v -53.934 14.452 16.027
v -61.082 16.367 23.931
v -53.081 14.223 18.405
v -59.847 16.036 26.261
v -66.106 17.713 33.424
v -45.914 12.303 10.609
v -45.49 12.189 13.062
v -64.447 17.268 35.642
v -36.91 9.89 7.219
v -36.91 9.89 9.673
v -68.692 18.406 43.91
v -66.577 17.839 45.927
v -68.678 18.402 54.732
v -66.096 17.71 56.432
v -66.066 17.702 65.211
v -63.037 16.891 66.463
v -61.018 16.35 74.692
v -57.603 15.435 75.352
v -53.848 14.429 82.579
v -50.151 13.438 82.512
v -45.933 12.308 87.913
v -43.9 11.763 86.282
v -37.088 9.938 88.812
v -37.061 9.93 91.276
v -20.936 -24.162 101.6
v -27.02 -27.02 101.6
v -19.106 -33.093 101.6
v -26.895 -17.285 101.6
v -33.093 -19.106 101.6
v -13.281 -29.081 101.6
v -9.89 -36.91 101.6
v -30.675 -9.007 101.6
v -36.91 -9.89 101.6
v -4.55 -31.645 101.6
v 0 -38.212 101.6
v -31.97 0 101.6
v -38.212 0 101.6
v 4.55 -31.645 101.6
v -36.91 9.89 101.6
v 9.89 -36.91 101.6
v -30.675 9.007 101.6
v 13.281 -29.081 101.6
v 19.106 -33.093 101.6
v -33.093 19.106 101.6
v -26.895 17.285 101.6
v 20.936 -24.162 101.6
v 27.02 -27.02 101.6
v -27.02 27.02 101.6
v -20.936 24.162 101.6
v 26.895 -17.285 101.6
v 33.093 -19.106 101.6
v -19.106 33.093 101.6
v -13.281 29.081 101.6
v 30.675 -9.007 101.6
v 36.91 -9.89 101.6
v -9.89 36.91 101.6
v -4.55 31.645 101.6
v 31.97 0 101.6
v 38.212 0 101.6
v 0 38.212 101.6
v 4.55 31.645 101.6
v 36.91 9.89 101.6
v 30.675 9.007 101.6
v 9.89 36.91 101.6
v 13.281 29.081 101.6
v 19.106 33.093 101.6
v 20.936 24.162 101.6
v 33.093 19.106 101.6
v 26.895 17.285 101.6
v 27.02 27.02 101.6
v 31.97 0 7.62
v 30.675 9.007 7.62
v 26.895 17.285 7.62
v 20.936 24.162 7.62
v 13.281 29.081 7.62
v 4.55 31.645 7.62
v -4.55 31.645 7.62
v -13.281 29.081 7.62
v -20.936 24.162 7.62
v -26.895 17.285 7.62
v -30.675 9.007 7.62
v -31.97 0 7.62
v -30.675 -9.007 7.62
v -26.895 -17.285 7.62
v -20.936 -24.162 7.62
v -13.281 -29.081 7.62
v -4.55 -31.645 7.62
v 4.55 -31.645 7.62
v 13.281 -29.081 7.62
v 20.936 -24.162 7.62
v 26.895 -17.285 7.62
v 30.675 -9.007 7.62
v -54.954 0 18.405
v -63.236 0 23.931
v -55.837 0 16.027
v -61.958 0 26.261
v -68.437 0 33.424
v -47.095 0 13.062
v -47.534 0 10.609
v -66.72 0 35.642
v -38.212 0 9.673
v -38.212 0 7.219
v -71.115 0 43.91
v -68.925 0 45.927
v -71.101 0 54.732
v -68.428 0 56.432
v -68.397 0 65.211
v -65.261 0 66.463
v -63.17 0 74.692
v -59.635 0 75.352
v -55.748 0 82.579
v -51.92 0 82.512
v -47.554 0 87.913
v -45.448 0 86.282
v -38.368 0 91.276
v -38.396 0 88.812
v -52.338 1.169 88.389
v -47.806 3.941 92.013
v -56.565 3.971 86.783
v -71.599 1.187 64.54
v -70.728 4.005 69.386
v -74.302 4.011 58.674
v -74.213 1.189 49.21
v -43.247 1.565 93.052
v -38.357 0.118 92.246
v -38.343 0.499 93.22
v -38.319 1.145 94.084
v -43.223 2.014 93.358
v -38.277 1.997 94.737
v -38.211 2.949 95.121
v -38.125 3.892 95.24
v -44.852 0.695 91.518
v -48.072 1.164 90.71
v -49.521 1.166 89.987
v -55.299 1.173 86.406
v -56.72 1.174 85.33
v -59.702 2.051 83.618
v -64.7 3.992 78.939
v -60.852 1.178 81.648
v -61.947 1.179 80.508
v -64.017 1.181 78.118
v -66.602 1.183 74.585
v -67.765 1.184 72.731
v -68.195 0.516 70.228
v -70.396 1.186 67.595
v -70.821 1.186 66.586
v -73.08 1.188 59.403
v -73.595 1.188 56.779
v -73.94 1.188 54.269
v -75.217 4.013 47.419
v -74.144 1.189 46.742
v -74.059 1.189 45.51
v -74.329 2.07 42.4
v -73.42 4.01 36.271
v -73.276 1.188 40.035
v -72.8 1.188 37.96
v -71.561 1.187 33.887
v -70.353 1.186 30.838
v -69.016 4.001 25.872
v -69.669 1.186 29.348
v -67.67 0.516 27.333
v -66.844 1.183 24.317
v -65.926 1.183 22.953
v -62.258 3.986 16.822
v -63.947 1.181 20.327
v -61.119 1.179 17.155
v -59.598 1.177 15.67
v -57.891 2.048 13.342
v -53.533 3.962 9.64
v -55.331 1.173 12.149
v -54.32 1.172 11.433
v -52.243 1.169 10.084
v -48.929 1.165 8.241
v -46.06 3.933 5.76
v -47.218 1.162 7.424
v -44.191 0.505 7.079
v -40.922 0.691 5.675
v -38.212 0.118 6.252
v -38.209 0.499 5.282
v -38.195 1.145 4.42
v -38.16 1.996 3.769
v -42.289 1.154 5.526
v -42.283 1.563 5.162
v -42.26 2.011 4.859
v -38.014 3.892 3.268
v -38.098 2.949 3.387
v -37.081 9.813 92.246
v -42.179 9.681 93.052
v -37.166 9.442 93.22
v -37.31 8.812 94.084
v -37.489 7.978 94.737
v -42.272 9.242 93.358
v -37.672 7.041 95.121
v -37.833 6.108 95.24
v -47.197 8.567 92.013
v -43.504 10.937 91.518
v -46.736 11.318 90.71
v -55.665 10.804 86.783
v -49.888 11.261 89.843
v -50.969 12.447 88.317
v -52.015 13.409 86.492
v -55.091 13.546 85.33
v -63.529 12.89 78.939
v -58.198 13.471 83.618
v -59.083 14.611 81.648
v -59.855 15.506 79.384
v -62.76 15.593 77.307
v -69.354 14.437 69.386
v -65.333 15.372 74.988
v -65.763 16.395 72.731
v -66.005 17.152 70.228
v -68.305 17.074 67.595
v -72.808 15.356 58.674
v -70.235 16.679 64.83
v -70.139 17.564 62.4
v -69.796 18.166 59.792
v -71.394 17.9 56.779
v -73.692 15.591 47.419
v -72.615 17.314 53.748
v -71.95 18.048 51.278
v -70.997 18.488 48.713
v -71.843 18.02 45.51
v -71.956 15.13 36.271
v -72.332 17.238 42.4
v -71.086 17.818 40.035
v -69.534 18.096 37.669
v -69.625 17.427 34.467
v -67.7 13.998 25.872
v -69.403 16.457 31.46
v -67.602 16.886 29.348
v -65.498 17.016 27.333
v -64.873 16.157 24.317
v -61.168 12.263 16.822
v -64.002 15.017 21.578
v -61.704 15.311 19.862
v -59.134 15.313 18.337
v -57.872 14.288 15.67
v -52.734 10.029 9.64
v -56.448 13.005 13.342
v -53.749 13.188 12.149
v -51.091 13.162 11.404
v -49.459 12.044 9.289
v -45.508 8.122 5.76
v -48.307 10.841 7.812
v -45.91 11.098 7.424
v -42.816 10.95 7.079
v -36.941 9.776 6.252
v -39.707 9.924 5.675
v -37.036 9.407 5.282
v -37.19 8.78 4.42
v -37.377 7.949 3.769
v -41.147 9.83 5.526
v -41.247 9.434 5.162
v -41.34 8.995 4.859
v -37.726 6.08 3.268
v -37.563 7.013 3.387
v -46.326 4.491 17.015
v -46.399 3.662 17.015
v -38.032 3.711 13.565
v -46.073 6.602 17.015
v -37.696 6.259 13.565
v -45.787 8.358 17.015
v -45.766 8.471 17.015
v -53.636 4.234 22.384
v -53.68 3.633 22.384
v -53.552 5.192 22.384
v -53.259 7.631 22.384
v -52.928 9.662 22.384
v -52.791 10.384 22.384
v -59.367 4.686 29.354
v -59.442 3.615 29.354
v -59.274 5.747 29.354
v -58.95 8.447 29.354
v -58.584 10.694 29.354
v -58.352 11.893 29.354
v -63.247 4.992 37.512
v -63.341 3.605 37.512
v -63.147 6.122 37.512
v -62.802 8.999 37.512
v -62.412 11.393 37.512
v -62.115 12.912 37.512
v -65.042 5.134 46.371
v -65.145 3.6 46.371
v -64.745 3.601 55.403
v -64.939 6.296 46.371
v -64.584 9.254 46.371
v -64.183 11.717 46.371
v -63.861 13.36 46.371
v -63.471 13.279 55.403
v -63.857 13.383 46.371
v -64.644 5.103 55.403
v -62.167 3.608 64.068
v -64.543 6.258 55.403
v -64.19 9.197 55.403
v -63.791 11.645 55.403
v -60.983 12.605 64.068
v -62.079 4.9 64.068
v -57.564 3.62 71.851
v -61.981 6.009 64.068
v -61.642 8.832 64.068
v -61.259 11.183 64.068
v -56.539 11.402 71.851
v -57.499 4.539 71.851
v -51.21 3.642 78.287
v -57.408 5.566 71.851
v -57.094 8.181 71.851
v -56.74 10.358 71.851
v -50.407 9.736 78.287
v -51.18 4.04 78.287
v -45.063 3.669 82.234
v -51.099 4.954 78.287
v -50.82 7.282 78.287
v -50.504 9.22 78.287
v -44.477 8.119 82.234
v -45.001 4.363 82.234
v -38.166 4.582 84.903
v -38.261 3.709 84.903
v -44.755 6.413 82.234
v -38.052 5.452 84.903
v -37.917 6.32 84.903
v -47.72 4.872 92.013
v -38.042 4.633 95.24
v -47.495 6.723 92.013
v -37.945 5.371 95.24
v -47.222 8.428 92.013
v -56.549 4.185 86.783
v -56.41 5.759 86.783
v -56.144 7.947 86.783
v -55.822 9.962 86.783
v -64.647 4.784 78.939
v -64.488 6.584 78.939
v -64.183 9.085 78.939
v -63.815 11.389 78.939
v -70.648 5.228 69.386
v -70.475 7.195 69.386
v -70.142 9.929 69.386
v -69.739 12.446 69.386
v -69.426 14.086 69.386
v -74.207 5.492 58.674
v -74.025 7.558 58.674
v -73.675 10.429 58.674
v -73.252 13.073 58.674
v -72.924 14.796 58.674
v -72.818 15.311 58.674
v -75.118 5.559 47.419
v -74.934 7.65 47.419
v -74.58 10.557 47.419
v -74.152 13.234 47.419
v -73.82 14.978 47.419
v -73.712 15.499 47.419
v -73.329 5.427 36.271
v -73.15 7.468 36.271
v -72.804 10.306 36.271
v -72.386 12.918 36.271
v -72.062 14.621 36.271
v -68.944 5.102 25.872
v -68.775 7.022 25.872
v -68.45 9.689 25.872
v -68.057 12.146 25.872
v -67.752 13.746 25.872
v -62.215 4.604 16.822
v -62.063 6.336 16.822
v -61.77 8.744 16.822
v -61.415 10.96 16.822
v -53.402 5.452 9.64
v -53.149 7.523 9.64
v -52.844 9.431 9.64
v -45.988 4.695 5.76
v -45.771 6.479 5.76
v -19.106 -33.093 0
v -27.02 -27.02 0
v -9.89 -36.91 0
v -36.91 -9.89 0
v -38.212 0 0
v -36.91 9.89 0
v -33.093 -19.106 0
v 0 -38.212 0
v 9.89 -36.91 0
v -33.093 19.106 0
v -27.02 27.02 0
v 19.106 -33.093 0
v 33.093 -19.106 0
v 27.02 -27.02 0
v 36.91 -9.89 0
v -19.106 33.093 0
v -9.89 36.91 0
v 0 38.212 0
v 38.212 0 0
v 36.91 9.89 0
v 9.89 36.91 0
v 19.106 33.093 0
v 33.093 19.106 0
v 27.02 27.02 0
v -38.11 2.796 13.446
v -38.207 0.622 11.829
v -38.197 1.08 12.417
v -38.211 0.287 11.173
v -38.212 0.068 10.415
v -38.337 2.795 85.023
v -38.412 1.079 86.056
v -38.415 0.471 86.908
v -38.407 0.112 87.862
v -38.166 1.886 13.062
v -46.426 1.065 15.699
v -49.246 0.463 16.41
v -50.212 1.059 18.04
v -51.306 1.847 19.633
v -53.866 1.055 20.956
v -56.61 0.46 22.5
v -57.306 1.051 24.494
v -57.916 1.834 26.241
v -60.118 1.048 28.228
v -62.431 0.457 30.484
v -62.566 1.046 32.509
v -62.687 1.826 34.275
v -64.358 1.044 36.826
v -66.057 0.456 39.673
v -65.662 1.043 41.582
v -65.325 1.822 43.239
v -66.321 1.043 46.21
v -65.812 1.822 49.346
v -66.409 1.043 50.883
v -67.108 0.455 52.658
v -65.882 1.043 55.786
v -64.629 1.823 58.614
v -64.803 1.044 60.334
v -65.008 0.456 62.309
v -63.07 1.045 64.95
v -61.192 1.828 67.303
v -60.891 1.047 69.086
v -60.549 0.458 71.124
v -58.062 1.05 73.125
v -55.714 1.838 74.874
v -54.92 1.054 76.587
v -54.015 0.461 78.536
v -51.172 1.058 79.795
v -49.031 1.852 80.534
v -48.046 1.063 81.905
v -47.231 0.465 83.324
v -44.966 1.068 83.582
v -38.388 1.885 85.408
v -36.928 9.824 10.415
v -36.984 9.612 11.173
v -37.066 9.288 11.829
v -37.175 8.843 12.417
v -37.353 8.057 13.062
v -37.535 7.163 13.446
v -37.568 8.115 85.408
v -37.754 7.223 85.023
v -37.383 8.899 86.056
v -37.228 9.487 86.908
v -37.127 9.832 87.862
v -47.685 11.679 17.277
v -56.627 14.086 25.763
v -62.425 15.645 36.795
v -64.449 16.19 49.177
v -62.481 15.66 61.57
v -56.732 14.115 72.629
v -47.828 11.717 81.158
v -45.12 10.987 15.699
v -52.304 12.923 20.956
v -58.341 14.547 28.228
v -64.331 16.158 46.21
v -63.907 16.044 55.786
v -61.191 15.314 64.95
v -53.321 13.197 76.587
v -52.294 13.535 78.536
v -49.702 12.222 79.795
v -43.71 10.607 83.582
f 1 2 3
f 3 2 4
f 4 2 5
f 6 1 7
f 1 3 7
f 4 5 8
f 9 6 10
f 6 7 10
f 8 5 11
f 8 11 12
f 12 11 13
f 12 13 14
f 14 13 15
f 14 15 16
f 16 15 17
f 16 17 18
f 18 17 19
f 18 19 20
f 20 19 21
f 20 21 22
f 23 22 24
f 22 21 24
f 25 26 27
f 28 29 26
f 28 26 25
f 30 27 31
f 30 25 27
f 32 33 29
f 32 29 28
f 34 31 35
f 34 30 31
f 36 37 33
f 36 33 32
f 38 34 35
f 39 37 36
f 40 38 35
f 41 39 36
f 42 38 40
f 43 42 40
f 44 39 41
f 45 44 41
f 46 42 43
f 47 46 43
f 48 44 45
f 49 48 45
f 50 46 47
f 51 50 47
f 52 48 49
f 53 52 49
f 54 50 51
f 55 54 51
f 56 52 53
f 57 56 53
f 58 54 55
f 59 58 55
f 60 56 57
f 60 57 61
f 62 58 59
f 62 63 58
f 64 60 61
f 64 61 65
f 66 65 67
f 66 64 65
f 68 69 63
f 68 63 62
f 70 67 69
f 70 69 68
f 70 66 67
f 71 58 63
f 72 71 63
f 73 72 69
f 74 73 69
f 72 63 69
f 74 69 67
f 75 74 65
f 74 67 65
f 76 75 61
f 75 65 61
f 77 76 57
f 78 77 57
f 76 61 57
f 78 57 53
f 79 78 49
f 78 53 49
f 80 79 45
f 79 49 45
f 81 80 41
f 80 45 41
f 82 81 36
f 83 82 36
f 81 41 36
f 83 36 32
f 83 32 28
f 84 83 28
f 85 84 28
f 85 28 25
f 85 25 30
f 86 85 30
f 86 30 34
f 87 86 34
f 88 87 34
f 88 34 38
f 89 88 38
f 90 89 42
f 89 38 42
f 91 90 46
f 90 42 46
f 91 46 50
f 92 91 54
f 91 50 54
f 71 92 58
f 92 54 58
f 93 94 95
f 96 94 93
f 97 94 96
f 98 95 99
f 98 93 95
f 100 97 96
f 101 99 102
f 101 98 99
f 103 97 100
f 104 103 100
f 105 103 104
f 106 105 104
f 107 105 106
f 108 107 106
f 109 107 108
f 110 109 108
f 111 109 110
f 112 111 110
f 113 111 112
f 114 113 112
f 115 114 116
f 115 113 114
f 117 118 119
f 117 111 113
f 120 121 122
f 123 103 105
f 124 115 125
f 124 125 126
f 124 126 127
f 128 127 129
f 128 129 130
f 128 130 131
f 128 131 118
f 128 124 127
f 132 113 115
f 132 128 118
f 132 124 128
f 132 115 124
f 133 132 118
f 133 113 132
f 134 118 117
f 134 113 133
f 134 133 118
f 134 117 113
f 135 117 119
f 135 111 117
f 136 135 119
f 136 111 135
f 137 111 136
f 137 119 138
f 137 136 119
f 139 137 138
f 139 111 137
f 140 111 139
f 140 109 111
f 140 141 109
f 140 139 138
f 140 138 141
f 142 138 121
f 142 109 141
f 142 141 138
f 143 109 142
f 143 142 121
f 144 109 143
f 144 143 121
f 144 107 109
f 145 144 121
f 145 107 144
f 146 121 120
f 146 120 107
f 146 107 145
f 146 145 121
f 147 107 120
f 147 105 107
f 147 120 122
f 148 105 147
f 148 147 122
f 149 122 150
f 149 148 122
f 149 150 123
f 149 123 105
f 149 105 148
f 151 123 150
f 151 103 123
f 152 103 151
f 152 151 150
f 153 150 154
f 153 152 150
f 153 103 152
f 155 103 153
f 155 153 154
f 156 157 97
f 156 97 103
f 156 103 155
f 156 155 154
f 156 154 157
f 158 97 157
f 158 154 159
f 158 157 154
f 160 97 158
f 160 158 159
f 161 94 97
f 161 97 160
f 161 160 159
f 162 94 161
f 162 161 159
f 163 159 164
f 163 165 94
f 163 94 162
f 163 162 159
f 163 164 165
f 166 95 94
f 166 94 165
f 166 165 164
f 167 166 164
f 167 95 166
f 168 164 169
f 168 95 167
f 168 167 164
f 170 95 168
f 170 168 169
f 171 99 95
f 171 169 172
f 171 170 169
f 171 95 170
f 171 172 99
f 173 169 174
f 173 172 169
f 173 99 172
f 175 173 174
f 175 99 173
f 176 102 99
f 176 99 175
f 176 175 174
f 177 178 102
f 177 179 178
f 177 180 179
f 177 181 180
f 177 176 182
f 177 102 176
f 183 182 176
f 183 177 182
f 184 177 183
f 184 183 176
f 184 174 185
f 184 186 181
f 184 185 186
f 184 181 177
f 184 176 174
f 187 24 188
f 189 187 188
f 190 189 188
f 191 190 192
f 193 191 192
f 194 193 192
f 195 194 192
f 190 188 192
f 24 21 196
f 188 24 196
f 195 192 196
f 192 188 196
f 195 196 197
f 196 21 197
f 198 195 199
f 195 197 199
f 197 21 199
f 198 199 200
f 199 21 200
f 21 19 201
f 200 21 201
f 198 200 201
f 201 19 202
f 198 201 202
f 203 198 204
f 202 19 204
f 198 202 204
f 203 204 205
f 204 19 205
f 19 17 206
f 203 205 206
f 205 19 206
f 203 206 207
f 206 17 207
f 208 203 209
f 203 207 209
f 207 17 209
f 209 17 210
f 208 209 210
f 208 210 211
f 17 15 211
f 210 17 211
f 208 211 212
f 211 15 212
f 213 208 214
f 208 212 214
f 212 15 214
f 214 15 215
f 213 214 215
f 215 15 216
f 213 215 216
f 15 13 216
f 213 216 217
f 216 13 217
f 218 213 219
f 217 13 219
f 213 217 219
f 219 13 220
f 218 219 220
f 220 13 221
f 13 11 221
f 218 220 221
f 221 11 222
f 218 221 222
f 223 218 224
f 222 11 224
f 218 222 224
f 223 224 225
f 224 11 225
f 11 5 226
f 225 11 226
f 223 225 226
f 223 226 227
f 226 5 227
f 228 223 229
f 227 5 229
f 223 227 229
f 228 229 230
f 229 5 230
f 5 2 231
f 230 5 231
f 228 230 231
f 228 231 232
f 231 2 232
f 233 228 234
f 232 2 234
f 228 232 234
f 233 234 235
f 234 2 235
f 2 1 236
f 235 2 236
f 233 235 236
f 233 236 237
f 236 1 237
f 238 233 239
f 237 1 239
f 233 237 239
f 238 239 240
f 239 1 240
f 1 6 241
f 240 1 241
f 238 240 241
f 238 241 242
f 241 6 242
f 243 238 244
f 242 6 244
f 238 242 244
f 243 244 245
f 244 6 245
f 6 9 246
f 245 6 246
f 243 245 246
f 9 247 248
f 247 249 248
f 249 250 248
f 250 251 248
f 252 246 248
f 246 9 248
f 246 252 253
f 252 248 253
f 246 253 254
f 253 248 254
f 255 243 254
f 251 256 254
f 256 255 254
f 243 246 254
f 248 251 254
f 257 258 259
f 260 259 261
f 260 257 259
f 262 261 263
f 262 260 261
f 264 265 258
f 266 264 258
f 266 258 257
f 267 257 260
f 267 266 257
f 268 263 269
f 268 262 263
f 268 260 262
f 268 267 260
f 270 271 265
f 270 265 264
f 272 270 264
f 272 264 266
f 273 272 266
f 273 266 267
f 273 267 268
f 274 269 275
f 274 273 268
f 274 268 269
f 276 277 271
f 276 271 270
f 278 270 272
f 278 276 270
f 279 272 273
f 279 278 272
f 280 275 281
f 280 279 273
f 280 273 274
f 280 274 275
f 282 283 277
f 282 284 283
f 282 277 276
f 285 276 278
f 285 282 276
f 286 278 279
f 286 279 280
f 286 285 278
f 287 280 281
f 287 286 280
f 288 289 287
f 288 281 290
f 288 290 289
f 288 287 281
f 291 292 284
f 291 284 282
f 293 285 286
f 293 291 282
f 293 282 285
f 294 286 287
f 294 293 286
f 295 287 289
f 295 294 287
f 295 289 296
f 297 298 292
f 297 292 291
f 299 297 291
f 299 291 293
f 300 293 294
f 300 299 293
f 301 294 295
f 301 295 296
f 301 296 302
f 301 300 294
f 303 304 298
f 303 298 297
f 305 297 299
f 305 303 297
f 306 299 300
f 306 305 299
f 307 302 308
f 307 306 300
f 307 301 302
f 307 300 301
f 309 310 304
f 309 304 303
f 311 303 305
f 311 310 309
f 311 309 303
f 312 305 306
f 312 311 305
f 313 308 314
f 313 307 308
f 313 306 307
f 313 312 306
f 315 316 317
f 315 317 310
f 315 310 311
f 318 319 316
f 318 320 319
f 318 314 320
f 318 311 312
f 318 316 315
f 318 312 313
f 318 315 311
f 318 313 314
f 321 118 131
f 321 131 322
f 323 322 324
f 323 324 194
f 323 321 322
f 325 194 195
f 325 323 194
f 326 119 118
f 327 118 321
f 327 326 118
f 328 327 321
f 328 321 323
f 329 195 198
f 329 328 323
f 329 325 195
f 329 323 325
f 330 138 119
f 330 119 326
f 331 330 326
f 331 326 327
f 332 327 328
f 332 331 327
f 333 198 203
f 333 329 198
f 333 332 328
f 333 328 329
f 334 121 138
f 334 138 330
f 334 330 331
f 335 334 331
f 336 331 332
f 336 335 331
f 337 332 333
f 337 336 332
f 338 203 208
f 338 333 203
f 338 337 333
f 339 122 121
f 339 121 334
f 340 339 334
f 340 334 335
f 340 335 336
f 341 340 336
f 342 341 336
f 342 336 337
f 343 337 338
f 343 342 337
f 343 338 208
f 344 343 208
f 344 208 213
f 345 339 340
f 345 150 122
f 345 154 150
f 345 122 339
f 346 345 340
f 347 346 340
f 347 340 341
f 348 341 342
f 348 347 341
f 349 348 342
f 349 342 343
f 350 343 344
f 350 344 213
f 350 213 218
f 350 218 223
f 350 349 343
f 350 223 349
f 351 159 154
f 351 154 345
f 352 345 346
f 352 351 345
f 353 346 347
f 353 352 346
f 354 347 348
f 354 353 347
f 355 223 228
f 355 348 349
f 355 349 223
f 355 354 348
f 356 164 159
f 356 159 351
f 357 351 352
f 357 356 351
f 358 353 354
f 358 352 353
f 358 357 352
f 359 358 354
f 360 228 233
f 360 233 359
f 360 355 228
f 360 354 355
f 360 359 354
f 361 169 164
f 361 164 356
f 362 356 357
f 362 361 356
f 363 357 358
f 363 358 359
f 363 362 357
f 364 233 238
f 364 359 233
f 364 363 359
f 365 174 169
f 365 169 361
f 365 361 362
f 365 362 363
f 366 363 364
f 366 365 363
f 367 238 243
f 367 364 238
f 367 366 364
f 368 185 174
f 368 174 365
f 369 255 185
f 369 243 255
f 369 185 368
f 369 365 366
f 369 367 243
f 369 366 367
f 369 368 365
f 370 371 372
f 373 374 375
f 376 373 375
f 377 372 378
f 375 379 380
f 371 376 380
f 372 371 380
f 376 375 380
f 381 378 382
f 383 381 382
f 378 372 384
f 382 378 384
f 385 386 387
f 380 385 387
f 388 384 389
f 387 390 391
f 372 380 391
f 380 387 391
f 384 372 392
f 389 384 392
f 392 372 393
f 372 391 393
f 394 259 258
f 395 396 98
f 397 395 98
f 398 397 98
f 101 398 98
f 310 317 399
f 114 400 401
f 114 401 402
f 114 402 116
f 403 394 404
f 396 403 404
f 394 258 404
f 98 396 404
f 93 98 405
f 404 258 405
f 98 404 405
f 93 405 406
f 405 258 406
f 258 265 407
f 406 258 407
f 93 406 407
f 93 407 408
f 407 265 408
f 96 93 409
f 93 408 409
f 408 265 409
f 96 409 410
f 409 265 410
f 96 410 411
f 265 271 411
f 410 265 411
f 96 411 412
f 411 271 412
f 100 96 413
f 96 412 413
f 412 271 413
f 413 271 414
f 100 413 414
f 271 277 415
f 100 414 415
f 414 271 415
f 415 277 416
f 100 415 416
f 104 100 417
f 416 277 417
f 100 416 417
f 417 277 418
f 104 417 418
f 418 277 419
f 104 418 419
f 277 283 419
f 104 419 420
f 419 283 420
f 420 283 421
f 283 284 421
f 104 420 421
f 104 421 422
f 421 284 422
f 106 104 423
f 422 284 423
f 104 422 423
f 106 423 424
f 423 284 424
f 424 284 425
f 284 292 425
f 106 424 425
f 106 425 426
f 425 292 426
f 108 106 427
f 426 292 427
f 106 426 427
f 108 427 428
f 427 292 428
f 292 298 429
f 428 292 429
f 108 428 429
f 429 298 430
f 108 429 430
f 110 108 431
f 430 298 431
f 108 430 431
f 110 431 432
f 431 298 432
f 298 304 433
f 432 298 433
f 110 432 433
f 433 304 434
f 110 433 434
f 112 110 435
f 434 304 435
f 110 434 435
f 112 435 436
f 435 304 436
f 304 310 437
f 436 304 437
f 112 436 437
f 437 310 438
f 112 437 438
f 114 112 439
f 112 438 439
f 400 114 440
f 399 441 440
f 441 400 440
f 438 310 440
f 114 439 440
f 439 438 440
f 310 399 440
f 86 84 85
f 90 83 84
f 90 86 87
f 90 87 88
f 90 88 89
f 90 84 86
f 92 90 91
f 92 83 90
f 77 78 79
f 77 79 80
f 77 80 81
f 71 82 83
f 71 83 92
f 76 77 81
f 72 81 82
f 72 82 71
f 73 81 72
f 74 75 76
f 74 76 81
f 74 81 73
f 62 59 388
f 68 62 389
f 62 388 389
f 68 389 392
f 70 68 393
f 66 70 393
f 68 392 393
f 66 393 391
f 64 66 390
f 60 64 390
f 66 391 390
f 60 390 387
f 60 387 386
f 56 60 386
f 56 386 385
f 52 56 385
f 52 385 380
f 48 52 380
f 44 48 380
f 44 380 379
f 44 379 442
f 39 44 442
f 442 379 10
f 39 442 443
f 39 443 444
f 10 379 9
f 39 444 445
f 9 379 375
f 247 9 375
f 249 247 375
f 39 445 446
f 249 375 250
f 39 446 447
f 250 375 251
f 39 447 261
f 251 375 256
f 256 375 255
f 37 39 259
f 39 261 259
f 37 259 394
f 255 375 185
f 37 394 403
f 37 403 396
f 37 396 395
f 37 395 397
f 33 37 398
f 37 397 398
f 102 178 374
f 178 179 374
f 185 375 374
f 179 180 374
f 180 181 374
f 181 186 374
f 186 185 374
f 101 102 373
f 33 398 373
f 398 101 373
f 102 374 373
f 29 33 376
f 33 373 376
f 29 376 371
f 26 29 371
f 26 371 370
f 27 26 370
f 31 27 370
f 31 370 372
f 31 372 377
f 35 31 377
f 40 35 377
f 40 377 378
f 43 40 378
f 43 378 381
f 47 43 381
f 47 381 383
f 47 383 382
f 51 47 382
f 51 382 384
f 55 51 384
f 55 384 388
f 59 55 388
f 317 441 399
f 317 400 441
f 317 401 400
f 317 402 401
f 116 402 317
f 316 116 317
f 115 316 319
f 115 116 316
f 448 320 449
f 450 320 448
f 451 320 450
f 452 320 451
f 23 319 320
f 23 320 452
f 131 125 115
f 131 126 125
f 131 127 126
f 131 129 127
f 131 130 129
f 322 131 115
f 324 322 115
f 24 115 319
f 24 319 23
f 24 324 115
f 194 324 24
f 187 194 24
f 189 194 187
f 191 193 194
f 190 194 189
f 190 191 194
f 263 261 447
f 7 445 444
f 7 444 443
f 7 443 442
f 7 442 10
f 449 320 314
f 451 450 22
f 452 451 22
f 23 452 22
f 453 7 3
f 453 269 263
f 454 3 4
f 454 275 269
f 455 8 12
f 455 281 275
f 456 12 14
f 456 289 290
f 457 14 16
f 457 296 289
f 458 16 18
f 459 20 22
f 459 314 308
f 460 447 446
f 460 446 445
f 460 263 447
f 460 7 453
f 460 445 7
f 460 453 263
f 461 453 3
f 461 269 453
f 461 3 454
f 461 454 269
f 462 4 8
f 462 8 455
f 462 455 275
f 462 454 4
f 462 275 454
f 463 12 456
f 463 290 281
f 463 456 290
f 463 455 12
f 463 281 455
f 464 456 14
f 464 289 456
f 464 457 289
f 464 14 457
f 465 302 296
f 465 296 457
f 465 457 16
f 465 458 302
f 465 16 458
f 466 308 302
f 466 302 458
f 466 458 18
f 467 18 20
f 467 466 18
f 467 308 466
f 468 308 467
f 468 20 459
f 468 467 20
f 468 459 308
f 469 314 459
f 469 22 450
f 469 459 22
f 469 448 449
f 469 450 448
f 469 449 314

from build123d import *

# Parameters (mm, degrees)
F0_R     = 38.212329
F1_DEPTH = 101.6
F2_R     = 31.970454
F3_DEPTH = 93.98
F5_ANGLE = 15
F6_R     = 3.81


with BuildPart() as f1:
    # F0 (on Top) → F1 (new body)
    with BuildSketch(Plane.XY):
        Circle(F0_R)
    extrude(amount=F1_DEPTH)

    # F2 (on face) → F3 (cut)
    with BuildSketch(Plane.XY.offset(101.6)):
        Circle(F2_R)
    extrude(amount=-F3_DEPTH, mode=Mode.SUBTRACT)

    # F4 (on Front) → F5 (revolve)
    with BuildSketch(Plane.XZ):
        with BuildLine():
            ThreePointArc((-37.823336, 13.45957), (-65.355852, 48.945968), (-38.440386, 84.90263))
            Line((-38.440386, 84.90263), (-38.323194, 95.239505))
            ThreePointArc((-38.323194, 95.239505), (-75.359479, 49.064441), (-37.929054, 3.208294))
            Line((-37.929054, 3.208294), (-37.823336, 13.45957))
        make_face()
    revolve(axis=Axis((0, 0, 0), (0, 0, -1)), revolution_arc=F5_ANGLE)

    # F6
    f6_edges = [f1.edges().sort_by_distance(p)[0] for p in [
        (-63.130057, 16.915648, 49.147506),
        (-72.792051, 19.504571, 49.209229),
        (-65.357045, 0, 49.147506),
        (-75.359876, 0, 49.209229),
    ]]
    fillet(f6_edges, radius=F6_R)


solid = f1.part
